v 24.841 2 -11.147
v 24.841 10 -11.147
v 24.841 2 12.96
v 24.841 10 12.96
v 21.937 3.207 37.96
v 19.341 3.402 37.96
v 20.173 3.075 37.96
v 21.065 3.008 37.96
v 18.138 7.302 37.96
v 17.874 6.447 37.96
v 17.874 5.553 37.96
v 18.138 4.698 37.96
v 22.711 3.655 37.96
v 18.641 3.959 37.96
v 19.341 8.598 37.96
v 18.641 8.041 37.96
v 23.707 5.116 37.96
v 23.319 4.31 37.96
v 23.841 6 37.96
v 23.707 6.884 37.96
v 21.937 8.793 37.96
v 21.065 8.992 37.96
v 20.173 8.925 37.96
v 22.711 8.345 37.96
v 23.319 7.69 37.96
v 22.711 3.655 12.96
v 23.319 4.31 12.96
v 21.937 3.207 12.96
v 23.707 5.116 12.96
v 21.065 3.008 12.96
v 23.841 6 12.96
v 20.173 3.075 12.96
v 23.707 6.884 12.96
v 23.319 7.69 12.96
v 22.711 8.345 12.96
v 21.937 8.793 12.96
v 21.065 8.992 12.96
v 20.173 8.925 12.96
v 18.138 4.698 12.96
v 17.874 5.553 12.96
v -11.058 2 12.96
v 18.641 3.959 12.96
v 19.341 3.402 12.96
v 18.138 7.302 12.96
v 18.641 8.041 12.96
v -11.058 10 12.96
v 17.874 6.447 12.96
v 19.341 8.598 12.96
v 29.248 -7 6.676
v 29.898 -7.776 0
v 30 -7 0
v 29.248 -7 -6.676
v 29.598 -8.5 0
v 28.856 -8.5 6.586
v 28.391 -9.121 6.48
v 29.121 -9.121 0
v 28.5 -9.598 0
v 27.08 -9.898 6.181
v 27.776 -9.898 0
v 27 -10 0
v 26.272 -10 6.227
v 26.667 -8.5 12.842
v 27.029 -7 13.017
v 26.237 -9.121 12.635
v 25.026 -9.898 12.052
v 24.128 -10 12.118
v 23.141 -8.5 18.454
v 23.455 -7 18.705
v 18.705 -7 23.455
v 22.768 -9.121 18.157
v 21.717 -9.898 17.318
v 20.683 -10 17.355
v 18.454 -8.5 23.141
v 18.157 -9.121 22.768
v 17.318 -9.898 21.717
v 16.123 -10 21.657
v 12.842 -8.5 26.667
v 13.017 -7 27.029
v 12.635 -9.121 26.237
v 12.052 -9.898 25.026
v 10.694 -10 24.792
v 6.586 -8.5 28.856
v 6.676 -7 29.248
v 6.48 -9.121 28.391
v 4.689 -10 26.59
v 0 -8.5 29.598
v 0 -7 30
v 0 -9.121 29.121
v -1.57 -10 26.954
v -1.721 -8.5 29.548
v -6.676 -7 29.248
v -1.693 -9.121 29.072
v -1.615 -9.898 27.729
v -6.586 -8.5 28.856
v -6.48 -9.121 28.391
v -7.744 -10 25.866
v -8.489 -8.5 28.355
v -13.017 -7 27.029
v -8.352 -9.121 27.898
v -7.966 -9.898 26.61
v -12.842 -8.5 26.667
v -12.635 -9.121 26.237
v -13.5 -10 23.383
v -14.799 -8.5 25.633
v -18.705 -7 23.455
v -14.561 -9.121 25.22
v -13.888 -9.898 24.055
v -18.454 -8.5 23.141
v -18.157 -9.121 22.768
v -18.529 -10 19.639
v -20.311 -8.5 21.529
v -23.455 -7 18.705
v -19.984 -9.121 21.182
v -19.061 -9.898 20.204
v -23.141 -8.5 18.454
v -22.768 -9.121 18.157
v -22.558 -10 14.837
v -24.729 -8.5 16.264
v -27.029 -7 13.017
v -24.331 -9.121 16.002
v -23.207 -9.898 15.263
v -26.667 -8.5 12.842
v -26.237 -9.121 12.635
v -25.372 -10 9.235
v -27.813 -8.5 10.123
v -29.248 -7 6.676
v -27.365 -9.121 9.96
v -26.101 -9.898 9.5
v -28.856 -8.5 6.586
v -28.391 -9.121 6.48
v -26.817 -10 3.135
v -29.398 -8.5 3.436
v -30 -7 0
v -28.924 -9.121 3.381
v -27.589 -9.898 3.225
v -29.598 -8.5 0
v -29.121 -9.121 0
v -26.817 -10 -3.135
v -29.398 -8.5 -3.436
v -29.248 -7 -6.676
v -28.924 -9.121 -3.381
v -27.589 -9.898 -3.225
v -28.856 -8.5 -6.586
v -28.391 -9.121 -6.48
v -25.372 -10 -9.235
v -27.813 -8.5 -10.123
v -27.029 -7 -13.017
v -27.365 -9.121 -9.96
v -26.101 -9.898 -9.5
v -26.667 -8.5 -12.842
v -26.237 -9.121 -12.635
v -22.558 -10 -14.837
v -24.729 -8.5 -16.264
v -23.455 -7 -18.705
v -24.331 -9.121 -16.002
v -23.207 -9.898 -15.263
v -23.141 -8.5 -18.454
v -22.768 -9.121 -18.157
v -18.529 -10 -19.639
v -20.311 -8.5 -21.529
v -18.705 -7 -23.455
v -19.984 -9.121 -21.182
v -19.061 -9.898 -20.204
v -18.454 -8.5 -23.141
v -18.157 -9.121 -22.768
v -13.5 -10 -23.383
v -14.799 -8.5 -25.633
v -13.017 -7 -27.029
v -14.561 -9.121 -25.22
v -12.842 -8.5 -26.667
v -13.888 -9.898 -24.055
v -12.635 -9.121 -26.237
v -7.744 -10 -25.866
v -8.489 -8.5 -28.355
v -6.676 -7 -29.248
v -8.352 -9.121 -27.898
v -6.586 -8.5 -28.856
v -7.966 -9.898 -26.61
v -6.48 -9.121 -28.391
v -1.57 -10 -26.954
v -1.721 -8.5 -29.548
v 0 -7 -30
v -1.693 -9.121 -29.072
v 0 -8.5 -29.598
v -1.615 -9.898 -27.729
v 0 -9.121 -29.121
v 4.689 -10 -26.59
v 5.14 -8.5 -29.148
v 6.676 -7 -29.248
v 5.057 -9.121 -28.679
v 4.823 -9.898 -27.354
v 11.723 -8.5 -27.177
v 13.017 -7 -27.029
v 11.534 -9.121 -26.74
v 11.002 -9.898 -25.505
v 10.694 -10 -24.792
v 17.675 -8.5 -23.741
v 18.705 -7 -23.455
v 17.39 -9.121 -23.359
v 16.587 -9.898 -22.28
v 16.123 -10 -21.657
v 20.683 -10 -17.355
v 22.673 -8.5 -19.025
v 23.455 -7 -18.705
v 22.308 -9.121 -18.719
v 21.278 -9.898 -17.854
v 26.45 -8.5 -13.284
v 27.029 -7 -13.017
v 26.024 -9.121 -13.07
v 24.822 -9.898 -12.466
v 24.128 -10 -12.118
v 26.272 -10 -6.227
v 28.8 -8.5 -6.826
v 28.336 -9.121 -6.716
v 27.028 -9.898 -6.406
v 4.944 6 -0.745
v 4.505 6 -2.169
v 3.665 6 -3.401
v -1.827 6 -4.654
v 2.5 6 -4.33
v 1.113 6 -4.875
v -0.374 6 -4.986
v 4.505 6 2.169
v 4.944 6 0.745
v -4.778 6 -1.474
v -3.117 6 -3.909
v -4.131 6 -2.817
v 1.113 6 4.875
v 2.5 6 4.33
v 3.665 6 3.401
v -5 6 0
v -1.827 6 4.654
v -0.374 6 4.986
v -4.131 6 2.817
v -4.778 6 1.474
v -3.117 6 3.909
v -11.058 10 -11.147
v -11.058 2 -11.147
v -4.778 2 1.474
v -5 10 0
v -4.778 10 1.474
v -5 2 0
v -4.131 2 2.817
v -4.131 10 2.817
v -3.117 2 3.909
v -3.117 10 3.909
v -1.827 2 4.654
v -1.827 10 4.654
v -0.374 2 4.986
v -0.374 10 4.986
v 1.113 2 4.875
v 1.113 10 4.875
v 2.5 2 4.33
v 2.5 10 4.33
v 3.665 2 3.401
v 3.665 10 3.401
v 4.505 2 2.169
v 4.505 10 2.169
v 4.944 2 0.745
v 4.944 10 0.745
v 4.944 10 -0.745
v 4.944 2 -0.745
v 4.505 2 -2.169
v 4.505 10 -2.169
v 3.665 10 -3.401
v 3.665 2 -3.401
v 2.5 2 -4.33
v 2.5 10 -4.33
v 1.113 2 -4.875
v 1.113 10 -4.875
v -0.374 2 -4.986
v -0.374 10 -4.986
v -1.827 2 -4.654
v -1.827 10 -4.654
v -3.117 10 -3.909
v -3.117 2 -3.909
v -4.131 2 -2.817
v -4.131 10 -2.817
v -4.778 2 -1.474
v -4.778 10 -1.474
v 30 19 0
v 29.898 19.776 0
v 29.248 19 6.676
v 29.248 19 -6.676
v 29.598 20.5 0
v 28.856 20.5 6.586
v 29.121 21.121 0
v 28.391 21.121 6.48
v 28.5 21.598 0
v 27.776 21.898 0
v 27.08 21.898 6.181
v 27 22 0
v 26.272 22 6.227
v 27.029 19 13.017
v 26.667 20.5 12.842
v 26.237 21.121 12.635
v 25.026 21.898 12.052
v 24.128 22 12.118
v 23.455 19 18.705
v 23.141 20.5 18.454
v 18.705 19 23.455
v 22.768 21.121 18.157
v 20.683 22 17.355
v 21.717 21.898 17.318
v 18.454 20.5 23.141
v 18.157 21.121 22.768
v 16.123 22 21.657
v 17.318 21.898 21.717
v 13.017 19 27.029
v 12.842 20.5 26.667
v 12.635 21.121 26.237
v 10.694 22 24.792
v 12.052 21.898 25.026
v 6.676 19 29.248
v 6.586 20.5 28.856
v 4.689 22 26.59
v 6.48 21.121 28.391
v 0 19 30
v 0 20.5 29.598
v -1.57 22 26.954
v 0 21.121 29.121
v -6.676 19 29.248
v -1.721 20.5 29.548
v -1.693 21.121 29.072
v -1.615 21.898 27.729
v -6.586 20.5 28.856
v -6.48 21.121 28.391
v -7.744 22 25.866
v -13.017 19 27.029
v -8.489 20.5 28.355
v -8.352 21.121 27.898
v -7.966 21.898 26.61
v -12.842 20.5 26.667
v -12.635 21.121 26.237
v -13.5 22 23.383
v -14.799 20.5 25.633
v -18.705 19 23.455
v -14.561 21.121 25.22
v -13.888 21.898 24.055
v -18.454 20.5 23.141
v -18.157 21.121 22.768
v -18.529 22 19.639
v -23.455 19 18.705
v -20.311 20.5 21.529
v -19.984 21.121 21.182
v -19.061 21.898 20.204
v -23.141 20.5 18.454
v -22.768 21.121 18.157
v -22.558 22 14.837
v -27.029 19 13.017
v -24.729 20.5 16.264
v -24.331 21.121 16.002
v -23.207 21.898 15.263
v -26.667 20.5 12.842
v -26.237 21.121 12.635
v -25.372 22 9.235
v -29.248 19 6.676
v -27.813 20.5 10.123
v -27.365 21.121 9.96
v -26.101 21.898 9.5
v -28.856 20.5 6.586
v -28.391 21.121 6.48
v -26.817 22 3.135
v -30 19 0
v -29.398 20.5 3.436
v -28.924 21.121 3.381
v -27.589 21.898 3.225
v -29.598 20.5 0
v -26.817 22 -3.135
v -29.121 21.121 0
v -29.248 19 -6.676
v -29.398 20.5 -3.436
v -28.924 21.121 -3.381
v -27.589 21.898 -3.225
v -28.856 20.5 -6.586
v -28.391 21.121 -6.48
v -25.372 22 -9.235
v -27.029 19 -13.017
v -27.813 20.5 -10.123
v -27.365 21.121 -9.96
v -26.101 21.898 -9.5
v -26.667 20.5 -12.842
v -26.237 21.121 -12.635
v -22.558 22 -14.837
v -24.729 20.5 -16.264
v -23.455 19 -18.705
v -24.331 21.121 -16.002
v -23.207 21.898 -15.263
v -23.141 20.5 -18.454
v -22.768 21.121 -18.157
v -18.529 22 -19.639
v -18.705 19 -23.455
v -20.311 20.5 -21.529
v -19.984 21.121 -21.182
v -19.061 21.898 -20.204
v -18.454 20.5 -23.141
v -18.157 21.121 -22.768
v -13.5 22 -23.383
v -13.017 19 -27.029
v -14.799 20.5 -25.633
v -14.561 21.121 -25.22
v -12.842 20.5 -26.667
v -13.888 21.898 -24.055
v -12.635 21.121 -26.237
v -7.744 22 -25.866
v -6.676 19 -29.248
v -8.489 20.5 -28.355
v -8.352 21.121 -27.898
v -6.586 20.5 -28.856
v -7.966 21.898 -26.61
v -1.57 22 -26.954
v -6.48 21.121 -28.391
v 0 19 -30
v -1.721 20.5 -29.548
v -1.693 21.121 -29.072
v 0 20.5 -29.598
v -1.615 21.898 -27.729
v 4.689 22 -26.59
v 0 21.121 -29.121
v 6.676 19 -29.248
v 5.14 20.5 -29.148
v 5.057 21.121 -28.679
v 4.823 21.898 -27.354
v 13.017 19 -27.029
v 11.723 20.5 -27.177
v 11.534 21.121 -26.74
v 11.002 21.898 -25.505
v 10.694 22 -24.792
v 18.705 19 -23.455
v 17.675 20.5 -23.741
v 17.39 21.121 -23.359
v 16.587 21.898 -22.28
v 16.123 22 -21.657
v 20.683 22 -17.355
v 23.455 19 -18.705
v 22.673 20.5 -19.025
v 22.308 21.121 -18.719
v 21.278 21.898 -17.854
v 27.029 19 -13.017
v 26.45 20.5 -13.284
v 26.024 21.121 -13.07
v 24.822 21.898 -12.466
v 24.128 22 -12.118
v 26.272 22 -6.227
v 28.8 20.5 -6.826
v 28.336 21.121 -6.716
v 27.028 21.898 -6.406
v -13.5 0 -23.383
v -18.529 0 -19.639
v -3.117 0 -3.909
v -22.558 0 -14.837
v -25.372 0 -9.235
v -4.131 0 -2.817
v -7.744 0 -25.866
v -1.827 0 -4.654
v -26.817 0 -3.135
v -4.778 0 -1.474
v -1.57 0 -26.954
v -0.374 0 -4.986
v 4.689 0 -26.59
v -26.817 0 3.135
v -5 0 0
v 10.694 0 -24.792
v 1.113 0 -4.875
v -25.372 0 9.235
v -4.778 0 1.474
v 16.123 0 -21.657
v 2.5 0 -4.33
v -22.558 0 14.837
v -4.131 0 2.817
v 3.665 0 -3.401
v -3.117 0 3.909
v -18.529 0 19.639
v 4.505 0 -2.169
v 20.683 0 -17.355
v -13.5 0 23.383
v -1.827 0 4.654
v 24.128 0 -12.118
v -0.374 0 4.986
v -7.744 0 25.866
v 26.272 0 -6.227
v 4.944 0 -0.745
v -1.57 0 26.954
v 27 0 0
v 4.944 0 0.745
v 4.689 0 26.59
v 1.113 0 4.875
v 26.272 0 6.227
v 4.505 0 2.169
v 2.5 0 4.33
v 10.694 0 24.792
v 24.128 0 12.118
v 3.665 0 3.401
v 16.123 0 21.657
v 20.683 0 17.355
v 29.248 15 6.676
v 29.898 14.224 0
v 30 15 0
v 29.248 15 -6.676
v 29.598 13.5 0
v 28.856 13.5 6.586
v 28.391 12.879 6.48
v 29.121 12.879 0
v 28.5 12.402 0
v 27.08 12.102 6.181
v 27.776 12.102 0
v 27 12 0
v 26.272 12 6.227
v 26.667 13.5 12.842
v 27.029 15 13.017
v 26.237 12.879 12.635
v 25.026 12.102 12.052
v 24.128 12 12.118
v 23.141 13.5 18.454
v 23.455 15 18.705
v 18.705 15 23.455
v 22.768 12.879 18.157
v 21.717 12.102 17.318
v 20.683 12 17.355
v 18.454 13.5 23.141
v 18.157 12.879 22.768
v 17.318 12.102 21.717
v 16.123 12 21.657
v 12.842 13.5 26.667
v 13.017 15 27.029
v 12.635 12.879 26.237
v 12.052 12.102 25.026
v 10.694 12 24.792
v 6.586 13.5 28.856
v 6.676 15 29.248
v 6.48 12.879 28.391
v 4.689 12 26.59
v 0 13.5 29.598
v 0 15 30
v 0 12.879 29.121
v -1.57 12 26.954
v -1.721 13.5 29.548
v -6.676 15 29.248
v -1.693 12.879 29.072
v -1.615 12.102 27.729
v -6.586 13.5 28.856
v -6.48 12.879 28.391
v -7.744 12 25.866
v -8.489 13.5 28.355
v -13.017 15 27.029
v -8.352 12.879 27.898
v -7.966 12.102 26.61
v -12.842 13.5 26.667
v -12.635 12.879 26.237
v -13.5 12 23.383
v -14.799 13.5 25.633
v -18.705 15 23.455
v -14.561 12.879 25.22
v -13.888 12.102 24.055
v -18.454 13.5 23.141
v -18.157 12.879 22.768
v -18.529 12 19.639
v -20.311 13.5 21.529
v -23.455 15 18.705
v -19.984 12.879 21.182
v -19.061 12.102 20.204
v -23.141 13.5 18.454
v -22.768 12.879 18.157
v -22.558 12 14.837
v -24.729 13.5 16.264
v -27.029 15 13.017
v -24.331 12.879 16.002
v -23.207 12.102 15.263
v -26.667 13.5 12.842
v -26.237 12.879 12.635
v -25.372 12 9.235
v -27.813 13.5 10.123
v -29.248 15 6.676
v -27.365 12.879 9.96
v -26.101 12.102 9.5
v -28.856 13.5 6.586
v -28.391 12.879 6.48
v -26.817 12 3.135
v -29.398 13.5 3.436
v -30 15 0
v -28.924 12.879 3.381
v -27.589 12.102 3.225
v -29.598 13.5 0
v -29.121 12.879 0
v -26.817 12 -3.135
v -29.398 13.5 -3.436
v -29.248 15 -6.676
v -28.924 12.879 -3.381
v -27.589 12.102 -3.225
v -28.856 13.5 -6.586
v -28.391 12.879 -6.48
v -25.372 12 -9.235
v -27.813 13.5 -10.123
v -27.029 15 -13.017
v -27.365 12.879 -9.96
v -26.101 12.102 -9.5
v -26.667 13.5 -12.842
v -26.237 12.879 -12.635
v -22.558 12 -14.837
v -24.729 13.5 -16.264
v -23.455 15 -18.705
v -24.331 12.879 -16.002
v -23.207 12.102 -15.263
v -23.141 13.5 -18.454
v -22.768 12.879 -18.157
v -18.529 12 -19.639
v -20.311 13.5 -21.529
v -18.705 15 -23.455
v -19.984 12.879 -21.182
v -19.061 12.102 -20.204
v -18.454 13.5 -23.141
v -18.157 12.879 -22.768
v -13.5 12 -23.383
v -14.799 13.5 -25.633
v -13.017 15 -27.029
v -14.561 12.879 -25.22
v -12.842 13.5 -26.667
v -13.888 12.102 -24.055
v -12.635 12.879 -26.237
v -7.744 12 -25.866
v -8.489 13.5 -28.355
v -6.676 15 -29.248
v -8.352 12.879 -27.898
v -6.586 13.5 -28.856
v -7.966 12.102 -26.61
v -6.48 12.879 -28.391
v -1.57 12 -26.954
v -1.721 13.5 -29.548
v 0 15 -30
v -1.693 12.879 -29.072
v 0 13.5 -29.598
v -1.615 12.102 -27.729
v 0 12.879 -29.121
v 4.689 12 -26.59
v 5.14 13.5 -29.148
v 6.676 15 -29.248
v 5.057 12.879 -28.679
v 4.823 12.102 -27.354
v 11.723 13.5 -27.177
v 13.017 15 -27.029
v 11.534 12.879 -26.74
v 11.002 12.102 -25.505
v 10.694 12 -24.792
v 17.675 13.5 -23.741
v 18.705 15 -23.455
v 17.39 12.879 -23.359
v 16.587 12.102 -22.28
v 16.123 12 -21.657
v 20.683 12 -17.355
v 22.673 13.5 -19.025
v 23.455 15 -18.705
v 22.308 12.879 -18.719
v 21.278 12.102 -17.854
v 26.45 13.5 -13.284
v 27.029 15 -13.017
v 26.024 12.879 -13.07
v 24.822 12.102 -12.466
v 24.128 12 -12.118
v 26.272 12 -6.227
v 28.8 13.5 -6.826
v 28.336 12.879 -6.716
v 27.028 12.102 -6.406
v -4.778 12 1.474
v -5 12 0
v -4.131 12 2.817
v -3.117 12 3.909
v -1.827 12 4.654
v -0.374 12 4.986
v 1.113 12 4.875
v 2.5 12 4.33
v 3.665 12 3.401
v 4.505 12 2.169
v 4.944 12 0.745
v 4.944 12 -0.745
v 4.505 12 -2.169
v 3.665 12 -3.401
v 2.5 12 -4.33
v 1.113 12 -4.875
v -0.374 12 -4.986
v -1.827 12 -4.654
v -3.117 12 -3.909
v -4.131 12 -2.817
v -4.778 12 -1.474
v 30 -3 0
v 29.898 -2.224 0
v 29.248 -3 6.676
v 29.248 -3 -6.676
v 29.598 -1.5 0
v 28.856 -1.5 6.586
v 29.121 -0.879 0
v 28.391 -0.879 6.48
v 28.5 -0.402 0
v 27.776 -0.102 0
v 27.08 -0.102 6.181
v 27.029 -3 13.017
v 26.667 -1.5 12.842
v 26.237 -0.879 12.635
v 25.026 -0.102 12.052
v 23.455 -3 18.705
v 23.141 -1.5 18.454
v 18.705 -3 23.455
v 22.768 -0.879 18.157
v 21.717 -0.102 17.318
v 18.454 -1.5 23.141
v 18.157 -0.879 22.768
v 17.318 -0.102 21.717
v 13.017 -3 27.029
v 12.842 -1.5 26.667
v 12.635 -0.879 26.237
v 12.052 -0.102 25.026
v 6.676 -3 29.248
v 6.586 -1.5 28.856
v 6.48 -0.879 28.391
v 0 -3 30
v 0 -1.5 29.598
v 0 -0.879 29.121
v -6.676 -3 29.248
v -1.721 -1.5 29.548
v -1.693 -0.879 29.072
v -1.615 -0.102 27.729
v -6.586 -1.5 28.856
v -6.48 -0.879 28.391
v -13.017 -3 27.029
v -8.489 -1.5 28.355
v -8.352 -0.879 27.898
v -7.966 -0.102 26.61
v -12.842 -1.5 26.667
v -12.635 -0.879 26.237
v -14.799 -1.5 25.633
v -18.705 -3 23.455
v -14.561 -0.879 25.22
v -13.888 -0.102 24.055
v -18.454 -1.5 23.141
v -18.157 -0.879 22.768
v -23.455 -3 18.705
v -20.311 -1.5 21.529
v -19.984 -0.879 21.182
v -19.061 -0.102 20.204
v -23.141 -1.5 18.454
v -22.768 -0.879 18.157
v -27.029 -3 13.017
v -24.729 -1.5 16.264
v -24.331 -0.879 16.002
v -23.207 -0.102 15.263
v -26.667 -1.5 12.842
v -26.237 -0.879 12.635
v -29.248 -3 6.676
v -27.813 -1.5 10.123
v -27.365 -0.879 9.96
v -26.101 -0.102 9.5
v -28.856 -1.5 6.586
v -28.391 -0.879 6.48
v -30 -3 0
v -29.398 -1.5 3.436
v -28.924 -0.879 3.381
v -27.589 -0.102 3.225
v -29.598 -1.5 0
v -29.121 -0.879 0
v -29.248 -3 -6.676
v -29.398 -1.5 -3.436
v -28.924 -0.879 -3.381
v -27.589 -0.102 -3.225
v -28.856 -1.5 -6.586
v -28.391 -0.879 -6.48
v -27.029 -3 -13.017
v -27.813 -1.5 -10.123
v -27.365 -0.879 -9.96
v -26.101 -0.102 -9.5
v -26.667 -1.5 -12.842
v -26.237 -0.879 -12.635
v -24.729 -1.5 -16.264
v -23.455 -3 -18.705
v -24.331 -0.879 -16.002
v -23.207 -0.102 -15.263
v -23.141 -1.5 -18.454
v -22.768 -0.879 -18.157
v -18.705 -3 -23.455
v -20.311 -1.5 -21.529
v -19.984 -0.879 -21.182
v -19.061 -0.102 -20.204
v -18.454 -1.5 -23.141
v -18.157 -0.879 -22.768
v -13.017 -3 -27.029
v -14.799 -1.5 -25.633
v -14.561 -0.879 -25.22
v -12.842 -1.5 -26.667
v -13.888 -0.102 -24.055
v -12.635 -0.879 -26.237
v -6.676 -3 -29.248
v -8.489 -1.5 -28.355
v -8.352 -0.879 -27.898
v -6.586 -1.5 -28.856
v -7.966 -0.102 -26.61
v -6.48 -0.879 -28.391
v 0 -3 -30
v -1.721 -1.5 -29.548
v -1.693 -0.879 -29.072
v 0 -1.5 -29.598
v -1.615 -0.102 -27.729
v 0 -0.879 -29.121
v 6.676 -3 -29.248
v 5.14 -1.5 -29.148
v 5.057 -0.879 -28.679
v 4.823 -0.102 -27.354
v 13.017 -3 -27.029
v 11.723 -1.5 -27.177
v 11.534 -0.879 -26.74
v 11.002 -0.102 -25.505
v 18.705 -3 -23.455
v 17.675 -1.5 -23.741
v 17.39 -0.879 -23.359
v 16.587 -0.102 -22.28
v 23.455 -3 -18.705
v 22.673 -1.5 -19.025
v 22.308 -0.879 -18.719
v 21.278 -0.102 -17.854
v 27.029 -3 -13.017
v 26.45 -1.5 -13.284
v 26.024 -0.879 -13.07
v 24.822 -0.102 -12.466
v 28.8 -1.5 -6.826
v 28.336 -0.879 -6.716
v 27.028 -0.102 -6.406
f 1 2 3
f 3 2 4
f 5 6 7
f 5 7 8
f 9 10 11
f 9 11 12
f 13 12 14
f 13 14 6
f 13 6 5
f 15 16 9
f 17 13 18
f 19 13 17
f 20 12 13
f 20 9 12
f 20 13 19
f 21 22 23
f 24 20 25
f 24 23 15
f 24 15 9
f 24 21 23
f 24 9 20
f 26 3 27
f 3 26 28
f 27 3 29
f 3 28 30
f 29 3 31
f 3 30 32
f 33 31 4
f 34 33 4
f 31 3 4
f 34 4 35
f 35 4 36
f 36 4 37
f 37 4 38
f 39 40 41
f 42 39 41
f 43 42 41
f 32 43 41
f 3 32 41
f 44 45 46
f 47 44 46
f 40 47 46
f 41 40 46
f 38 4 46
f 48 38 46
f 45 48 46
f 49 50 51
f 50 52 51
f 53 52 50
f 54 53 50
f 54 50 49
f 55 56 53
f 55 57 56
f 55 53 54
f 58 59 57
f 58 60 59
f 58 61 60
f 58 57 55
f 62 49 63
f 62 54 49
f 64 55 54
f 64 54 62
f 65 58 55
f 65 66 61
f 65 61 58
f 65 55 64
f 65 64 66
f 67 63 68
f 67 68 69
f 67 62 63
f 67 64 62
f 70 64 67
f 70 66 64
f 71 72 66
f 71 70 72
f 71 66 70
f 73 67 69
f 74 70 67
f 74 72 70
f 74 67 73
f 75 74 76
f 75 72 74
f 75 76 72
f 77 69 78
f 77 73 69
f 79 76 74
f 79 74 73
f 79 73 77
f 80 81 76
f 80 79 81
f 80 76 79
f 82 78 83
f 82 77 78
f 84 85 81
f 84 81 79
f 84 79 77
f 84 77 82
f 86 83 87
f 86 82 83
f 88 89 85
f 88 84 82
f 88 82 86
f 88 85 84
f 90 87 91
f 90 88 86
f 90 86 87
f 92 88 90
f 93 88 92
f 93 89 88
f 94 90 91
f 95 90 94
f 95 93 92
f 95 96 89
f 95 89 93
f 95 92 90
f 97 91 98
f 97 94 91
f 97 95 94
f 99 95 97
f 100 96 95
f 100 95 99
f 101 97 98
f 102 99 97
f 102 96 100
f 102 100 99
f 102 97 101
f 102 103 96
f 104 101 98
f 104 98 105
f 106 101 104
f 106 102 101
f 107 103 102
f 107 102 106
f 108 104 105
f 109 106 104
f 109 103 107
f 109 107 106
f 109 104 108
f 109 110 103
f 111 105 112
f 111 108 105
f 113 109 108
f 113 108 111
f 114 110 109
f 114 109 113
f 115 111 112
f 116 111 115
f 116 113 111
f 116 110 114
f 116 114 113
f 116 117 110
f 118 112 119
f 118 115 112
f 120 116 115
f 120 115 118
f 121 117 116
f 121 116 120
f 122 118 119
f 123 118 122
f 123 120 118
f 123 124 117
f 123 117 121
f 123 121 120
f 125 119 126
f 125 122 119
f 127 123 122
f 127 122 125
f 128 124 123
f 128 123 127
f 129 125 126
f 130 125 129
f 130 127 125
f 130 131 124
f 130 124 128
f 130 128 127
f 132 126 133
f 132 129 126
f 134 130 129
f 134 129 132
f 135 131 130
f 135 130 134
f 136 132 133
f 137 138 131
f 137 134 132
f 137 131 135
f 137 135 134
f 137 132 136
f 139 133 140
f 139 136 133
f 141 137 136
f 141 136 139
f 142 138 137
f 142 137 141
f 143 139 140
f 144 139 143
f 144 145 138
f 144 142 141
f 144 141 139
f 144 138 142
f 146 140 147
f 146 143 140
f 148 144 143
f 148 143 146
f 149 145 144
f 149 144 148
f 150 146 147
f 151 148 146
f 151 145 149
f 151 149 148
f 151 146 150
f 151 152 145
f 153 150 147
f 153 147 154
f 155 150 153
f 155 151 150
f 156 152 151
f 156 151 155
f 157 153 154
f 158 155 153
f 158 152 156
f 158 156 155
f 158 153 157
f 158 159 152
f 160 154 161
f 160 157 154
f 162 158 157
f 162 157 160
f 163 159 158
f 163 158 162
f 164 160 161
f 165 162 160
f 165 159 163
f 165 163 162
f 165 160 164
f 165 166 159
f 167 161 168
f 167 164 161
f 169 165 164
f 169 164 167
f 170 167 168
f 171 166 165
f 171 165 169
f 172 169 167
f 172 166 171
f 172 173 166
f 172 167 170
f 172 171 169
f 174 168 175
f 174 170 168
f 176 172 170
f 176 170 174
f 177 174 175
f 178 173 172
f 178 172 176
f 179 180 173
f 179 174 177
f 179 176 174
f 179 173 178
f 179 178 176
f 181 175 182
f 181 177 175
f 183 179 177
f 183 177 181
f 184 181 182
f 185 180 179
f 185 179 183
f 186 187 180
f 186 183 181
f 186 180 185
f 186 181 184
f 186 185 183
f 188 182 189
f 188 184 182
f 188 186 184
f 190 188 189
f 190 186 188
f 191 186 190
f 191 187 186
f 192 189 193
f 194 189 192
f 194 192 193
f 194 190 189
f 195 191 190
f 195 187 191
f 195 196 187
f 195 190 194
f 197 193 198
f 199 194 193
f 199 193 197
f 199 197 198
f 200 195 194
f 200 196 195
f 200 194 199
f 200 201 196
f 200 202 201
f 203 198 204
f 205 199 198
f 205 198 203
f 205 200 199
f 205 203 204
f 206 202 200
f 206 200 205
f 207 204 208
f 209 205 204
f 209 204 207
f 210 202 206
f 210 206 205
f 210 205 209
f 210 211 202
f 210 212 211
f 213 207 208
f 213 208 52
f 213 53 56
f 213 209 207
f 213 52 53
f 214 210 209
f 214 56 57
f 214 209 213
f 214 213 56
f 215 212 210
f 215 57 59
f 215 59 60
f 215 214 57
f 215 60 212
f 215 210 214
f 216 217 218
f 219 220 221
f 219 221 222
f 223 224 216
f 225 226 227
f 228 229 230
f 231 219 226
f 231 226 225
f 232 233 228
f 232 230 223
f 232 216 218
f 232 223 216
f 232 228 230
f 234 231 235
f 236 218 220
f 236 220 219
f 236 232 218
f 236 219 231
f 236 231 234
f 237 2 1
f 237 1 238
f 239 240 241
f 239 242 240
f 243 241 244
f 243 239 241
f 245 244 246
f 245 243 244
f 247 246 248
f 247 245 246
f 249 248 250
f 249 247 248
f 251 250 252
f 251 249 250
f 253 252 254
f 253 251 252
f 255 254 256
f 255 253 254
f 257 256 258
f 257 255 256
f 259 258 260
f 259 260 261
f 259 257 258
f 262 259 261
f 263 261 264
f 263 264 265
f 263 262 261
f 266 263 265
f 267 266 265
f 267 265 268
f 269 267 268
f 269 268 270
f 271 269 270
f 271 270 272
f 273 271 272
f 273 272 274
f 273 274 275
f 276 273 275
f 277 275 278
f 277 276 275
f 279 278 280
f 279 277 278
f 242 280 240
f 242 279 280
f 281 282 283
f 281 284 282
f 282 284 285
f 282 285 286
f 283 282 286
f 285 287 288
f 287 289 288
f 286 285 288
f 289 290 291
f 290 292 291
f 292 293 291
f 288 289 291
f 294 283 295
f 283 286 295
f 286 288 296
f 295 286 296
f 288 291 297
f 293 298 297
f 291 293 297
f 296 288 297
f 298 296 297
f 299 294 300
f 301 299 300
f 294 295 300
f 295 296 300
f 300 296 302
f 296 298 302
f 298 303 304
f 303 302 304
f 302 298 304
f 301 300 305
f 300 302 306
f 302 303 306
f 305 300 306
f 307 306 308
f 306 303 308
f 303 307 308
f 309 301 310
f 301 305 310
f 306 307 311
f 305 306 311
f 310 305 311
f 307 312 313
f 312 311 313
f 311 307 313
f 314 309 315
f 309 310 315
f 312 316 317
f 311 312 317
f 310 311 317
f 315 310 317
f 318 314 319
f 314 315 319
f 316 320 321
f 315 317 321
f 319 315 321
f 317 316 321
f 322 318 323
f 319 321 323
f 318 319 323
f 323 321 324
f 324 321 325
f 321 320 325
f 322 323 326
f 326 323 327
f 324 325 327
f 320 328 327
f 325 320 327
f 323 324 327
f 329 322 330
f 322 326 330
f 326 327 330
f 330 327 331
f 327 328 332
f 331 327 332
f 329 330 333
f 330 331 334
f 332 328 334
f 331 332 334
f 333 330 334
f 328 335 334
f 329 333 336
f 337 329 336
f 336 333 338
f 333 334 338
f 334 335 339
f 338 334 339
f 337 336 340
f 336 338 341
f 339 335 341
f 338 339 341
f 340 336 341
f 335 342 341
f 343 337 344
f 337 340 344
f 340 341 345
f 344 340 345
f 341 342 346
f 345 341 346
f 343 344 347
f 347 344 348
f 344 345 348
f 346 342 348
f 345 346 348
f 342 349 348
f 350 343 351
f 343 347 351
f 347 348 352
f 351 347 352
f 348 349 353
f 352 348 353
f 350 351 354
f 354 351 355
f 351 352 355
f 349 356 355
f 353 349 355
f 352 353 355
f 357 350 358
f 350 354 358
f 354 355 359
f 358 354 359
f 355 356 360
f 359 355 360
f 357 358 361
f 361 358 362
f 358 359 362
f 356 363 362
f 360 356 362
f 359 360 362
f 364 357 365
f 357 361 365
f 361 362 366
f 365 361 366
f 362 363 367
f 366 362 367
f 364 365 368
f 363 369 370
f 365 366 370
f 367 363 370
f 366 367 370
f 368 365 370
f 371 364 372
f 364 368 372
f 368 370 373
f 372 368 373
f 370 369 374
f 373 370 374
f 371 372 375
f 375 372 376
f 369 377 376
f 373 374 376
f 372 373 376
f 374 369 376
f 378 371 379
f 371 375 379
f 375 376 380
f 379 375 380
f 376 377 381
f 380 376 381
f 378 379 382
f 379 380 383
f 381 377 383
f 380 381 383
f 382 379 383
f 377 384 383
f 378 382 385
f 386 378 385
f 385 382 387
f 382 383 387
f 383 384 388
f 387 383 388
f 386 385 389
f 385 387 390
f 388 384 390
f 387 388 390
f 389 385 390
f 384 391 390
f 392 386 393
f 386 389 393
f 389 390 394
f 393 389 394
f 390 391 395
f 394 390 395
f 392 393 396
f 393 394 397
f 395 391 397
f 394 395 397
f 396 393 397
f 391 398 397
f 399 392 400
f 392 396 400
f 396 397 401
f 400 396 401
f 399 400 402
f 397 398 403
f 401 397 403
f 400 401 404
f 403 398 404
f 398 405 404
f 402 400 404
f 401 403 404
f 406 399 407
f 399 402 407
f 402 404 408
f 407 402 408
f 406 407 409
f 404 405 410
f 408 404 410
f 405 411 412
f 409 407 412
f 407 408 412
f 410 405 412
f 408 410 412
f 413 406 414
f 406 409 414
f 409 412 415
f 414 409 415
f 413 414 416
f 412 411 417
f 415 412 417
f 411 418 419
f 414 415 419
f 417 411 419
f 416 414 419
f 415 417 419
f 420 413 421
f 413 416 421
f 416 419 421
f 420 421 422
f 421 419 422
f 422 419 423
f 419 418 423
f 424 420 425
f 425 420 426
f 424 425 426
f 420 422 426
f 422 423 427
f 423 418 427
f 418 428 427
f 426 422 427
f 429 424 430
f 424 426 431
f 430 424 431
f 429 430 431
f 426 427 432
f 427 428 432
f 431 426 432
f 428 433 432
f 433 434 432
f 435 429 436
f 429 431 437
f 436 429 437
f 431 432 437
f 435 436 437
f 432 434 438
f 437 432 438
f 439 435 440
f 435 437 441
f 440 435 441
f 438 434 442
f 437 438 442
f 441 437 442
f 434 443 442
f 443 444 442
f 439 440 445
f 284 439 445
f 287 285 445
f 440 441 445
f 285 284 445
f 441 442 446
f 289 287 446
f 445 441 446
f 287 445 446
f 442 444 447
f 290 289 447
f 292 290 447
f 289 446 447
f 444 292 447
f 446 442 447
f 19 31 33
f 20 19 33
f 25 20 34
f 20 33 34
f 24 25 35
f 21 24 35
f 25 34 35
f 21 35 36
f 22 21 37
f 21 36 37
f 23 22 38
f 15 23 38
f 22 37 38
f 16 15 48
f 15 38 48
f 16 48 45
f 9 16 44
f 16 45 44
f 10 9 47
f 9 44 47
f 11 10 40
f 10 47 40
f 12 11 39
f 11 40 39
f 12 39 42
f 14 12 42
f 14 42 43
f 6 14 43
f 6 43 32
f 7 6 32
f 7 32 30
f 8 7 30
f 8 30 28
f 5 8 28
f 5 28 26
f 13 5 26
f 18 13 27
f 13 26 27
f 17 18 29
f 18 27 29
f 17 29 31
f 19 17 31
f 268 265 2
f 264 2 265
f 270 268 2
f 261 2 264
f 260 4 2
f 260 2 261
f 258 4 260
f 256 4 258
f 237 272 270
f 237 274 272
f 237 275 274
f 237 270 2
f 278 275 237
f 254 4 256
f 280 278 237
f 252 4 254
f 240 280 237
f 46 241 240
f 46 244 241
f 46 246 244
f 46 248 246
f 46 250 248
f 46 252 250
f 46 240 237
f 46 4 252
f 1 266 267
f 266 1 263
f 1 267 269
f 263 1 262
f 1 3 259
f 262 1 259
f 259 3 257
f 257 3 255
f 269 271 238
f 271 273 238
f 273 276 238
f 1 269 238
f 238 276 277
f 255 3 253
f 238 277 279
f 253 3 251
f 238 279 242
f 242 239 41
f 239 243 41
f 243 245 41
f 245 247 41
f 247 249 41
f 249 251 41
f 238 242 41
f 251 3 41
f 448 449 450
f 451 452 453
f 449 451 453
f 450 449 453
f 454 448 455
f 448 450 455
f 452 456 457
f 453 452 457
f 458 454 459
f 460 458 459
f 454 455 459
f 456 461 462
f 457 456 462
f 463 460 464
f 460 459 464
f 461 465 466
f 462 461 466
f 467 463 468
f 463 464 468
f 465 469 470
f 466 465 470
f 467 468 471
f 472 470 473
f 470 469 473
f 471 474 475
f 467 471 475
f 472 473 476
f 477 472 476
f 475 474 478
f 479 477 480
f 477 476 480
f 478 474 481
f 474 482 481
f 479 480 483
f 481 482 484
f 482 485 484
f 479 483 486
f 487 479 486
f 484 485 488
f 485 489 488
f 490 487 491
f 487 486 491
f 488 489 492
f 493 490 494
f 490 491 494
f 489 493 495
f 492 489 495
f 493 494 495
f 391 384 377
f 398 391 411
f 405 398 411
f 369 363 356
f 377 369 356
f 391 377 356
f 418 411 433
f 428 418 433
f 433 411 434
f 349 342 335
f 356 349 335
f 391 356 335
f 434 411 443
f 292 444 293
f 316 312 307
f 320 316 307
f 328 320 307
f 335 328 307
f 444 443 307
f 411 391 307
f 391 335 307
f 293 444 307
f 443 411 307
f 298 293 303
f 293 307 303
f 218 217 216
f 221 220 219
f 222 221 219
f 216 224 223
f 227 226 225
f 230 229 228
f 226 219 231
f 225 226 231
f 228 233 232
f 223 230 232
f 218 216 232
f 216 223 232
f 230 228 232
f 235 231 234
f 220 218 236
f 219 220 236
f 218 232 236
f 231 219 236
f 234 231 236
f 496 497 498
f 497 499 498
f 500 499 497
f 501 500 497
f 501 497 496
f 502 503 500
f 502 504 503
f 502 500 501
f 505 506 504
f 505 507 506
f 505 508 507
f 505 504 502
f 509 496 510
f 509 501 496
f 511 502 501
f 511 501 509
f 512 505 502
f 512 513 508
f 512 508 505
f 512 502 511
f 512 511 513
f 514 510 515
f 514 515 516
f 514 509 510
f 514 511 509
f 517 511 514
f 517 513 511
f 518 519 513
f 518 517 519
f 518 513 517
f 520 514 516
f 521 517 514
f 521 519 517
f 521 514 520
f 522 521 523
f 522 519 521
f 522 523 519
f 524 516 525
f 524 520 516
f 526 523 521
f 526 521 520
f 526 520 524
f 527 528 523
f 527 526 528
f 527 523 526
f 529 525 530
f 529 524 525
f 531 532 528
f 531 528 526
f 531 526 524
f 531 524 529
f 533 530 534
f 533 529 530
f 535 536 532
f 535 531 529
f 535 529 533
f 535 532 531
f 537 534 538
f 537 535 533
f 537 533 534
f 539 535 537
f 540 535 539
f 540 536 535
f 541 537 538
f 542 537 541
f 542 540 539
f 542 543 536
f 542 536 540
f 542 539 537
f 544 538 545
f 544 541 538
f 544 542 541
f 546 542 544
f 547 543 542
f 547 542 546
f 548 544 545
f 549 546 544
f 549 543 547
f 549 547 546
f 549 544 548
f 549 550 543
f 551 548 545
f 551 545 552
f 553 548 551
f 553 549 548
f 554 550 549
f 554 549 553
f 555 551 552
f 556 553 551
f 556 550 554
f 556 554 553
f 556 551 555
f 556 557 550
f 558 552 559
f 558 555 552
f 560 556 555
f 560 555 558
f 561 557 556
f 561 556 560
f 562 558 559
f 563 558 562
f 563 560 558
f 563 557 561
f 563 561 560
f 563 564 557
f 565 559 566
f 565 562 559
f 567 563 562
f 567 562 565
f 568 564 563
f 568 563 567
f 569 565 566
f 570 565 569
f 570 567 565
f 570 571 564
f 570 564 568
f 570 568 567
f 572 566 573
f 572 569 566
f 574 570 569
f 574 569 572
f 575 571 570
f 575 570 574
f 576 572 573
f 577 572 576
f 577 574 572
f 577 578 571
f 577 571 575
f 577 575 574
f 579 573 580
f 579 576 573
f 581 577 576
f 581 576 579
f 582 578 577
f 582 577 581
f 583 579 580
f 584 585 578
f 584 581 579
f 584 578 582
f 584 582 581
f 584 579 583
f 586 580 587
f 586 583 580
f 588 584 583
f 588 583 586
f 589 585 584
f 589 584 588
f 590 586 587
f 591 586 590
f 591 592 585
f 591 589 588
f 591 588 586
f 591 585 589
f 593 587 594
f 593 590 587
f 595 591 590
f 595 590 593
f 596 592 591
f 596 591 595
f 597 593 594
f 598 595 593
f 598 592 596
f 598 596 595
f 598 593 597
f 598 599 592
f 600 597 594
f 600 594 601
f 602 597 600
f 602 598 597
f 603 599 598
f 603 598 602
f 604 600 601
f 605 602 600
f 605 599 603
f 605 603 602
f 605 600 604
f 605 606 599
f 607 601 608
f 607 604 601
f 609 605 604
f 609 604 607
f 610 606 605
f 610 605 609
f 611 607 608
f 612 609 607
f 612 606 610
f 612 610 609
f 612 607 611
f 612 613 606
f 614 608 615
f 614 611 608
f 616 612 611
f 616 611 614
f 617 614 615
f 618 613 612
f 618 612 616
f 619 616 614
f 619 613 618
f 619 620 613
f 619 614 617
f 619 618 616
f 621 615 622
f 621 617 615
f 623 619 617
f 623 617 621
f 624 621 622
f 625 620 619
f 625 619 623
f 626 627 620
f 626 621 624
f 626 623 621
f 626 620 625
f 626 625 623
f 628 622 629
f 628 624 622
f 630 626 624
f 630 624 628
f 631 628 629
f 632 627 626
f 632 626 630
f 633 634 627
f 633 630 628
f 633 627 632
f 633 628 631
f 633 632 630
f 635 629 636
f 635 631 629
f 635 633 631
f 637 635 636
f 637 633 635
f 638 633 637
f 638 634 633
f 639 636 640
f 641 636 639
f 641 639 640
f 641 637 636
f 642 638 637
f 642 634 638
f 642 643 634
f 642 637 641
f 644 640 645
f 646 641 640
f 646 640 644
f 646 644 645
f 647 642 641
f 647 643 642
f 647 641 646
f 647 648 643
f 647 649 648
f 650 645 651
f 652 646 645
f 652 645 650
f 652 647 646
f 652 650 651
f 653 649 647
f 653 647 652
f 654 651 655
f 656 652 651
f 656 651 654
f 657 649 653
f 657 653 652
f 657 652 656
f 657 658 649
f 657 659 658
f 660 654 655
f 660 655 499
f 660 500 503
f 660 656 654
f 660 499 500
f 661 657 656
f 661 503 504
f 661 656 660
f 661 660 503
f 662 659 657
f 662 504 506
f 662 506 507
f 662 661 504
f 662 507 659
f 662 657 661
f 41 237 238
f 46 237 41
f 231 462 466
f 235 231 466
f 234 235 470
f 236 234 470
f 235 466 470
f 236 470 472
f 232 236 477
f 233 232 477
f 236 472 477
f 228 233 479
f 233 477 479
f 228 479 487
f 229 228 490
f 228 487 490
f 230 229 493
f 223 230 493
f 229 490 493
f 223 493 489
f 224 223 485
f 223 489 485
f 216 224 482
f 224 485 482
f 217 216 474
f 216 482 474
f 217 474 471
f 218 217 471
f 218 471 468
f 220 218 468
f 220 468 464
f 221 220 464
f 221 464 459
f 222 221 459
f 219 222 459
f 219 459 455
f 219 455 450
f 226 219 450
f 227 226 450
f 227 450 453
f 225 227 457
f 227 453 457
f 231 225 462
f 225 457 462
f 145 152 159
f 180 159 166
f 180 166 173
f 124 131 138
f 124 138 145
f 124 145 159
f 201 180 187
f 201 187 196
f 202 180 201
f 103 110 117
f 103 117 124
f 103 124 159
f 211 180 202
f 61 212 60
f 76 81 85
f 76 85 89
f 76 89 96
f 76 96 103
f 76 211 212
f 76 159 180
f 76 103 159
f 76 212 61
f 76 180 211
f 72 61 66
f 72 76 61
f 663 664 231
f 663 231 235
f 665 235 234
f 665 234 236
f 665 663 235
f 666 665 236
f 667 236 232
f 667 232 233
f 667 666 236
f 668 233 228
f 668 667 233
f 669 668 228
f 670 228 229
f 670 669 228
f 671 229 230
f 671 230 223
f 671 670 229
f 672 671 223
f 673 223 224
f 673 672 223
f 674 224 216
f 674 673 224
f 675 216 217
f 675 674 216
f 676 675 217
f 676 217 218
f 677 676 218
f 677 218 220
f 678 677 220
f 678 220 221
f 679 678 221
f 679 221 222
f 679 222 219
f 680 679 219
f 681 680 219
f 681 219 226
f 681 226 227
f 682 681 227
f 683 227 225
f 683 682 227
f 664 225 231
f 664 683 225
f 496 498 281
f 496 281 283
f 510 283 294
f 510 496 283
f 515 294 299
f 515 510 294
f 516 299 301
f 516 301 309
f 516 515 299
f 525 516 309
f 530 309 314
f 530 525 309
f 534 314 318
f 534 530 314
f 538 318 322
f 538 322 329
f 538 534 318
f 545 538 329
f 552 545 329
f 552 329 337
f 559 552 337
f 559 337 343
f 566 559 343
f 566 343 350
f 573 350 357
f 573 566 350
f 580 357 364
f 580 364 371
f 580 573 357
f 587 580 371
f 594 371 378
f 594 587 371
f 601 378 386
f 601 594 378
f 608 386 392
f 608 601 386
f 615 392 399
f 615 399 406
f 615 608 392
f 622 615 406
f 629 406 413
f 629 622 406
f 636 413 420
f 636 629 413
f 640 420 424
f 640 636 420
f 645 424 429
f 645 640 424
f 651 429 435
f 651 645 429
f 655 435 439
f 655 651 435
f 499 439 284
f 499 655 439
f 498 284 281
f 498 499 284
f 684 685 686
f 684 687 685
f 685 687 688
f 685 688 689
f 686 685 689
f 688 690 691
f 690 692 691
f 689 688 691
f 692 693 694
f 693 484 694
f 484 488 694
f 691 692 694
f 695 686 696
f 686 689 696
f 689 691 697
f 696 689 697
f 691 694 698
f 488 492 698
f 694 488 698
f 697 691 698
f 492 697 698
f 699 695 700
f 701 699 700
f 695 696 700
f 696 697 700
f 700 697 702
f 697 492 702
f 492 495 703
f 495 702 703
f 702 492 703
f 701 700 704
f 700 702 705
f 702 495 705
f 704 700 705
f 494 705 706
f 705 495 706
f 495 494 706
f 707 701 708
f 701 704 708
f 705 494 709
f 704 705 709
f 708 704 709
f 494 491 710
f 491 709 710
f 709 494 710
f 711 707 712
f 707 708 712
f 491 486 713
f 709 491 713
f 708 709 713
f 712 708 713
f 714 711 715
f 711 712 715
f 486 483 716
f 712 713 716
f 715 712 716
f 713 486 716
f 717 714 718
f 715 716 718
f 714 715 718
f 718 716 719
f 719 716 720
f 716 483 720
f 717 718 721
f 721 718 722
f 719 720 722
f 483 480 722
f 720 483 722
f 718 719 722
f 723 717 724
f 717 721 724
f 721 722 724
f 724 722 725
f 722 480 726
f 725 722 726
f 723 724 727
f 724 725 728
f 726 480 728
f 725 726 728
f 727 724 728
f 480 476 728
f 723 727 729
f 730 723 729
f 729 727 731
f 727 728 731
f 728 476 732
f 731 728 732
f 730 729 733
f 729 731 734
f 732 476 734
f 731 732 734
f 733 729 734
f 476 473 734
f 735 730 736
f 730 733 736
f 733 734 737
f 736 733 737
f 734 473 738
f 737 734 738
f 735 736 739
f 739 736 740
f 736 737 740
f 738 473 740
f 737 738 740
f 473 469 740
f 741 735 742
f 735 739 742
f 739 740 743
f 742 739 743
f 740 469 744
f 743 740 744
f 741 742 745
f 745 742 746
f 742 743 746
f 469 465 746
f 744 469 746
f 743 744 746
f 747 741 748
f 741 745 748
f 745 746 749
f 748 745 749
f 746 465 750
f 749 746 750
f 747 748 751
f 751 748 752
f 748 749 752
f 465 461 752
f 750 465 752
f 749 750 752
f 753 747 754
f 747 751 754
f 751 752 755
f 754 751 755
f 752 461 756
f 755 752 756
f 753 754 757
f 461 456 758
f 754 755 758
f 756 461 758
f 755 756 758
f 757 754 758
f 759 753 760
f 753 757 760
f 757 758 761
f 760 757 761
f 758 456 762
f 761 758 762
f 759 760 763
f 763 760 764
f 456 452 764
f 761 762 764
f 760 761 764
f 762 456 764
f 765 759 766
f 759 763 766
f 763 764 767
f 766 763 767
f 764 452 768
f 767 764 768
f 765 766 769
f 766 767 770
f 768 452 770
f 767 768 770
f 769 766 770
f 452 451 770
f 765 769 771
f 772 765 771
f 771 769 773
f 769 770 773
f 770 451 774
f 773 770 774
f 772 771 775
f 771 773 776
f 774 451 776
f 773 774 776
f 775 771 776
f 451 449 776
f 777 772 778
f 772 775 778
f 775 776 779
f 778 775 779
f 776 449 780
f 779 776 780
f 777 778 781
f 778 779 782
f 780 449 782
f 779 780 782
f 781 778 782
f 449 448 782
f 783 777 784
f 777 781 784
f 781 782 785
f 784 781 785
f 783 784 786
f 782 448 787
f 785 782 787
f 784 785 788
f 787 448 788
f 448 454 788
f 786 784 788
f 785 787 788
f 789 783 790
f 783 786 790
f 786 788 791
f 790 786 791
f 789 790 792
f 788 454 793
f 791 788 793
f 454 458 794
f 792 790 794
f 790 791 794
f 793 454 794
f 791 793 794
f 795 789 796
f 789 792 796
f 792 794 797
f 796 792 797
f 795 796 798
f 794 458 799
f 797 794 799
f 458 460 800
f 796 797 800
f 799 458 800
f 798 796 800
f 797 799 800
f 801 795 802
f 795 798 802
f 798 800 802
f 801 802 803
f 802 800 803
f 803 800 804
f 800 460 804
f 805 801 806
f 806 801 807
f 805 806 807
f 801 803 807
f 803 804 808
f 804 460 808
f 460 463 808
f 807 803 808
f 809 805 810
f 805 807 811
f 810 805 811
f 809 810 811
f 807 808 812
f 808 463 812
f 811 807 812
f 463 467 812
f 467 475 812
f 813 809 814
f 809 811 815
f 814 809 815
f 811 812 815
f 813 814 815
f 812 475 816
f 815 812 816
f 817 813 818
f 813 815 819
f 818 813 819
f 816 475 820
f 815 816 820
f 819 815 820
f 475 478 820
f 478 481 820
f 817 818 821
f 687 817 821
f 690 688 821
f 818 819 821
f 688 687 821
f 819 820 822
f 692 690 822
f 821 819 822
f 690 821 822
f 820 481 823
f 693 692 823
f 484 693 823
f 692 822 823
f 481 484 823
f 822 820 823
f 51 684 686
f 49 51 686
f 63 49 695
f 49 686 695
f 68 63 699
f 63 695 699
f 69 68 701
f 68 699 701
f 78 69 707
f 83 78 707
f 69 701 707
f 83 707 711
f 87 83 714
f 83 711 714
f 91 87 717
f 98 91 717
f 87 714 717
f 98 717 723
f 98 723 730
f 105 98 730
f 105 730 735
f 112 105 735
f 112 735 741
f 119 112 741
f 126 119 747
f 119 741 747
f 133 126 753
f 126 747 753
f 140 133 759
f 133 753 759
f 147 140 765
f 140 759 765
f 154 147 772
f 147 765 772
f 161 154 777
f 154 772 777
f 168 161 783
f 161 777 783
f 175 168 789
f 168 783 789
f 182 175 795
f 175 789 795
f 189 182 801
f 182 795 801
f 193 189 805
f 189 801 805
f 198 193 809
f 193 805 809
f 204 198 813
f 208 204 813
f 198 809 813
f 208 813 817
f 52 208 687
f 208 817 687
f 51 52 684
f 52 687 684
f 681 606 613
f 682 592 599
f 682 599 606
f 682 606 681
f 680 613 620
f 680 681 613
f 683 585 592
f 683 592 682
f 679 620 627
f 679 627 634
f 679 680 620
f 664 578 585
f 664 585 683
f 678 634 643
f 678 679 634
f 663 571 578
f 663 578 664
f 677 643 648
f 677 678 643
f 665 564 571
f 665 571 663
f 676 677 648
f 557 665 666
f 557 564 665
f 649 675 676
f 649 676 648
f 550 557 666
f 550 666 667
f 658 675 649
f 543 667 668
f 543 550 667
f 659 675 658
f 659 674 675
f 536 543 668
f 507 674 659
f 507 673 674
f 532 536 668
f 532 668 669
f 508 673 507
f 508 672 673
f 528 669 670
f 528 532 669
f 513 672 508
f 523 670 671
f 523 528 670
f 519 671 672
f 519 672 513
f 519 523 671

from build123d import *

# Parameters (mm, degrees)
F0_R     = 30
F1_DEPTH = 10
F2_R     = 3
F3_R     = 5
F4_DEPTH = 6
F6_W     = 35.899042
F6_H     = 24.106902
F6_R     = 5
F7_DEPTH = 4
F8_R     = 3
F9_DEPTH = 25


with BuildPart() as f1:
    # F0 (on Front) → F1 (new body)
    with BuildSketch(Plane.XZ):
        Circle(F0_R)
    extrude(amount=F1_DEPTH)

    # F2
    f2_edges = [f1.edges().sort_by_distance(p)[0] for p in [
        (-30, 0, 0),
        (-30, -10, 0),
    ]]
    fillet(f2_edges, radius=F2_R)

    # F3 (on face) → F4 (join)
    with BuildSketch(Plane(origin=(0, 0, 0), x_dir=(-1, 0, 0), z_dir=(0, 1, 0))):
        Circle(F3_R)
    extrude(amount=F4_DEPTH)


with BuildPart() as f5_1:
    # F5: instance of F1
    add(f1.part.mirror(Plane(origin=(0, 6, 0), x_dir=(-1, 0, 0), z_dir=(0, 1, 0))))


with BuildPart() as f7:
    # F6 (on face) → F7 (new body, symmetric)
    with BuildSketch(Plane(origin=(0, 6, 0), x_dir=(-1, 0, 0), z_dir=(0, 1, 0))):
        with Locations((-6.891085, 0.906796)):
            Rectangle(F6_W, F6_H)
        Circle(F6_R, mode=Mode.SUBTRACT)
    extrude(amount=F7_DEPTH, both=True)

    # F8 (on face) → F9 (join)
    with BuildSketch(Plane.XY.offset(12.960247)):
        with Locations((20.840606, 6)):
            Circle(F8_R)
    extrude(amount=F9_DEPTH)


solid = Compound([f1.part, f5_1.part, f7.part])
